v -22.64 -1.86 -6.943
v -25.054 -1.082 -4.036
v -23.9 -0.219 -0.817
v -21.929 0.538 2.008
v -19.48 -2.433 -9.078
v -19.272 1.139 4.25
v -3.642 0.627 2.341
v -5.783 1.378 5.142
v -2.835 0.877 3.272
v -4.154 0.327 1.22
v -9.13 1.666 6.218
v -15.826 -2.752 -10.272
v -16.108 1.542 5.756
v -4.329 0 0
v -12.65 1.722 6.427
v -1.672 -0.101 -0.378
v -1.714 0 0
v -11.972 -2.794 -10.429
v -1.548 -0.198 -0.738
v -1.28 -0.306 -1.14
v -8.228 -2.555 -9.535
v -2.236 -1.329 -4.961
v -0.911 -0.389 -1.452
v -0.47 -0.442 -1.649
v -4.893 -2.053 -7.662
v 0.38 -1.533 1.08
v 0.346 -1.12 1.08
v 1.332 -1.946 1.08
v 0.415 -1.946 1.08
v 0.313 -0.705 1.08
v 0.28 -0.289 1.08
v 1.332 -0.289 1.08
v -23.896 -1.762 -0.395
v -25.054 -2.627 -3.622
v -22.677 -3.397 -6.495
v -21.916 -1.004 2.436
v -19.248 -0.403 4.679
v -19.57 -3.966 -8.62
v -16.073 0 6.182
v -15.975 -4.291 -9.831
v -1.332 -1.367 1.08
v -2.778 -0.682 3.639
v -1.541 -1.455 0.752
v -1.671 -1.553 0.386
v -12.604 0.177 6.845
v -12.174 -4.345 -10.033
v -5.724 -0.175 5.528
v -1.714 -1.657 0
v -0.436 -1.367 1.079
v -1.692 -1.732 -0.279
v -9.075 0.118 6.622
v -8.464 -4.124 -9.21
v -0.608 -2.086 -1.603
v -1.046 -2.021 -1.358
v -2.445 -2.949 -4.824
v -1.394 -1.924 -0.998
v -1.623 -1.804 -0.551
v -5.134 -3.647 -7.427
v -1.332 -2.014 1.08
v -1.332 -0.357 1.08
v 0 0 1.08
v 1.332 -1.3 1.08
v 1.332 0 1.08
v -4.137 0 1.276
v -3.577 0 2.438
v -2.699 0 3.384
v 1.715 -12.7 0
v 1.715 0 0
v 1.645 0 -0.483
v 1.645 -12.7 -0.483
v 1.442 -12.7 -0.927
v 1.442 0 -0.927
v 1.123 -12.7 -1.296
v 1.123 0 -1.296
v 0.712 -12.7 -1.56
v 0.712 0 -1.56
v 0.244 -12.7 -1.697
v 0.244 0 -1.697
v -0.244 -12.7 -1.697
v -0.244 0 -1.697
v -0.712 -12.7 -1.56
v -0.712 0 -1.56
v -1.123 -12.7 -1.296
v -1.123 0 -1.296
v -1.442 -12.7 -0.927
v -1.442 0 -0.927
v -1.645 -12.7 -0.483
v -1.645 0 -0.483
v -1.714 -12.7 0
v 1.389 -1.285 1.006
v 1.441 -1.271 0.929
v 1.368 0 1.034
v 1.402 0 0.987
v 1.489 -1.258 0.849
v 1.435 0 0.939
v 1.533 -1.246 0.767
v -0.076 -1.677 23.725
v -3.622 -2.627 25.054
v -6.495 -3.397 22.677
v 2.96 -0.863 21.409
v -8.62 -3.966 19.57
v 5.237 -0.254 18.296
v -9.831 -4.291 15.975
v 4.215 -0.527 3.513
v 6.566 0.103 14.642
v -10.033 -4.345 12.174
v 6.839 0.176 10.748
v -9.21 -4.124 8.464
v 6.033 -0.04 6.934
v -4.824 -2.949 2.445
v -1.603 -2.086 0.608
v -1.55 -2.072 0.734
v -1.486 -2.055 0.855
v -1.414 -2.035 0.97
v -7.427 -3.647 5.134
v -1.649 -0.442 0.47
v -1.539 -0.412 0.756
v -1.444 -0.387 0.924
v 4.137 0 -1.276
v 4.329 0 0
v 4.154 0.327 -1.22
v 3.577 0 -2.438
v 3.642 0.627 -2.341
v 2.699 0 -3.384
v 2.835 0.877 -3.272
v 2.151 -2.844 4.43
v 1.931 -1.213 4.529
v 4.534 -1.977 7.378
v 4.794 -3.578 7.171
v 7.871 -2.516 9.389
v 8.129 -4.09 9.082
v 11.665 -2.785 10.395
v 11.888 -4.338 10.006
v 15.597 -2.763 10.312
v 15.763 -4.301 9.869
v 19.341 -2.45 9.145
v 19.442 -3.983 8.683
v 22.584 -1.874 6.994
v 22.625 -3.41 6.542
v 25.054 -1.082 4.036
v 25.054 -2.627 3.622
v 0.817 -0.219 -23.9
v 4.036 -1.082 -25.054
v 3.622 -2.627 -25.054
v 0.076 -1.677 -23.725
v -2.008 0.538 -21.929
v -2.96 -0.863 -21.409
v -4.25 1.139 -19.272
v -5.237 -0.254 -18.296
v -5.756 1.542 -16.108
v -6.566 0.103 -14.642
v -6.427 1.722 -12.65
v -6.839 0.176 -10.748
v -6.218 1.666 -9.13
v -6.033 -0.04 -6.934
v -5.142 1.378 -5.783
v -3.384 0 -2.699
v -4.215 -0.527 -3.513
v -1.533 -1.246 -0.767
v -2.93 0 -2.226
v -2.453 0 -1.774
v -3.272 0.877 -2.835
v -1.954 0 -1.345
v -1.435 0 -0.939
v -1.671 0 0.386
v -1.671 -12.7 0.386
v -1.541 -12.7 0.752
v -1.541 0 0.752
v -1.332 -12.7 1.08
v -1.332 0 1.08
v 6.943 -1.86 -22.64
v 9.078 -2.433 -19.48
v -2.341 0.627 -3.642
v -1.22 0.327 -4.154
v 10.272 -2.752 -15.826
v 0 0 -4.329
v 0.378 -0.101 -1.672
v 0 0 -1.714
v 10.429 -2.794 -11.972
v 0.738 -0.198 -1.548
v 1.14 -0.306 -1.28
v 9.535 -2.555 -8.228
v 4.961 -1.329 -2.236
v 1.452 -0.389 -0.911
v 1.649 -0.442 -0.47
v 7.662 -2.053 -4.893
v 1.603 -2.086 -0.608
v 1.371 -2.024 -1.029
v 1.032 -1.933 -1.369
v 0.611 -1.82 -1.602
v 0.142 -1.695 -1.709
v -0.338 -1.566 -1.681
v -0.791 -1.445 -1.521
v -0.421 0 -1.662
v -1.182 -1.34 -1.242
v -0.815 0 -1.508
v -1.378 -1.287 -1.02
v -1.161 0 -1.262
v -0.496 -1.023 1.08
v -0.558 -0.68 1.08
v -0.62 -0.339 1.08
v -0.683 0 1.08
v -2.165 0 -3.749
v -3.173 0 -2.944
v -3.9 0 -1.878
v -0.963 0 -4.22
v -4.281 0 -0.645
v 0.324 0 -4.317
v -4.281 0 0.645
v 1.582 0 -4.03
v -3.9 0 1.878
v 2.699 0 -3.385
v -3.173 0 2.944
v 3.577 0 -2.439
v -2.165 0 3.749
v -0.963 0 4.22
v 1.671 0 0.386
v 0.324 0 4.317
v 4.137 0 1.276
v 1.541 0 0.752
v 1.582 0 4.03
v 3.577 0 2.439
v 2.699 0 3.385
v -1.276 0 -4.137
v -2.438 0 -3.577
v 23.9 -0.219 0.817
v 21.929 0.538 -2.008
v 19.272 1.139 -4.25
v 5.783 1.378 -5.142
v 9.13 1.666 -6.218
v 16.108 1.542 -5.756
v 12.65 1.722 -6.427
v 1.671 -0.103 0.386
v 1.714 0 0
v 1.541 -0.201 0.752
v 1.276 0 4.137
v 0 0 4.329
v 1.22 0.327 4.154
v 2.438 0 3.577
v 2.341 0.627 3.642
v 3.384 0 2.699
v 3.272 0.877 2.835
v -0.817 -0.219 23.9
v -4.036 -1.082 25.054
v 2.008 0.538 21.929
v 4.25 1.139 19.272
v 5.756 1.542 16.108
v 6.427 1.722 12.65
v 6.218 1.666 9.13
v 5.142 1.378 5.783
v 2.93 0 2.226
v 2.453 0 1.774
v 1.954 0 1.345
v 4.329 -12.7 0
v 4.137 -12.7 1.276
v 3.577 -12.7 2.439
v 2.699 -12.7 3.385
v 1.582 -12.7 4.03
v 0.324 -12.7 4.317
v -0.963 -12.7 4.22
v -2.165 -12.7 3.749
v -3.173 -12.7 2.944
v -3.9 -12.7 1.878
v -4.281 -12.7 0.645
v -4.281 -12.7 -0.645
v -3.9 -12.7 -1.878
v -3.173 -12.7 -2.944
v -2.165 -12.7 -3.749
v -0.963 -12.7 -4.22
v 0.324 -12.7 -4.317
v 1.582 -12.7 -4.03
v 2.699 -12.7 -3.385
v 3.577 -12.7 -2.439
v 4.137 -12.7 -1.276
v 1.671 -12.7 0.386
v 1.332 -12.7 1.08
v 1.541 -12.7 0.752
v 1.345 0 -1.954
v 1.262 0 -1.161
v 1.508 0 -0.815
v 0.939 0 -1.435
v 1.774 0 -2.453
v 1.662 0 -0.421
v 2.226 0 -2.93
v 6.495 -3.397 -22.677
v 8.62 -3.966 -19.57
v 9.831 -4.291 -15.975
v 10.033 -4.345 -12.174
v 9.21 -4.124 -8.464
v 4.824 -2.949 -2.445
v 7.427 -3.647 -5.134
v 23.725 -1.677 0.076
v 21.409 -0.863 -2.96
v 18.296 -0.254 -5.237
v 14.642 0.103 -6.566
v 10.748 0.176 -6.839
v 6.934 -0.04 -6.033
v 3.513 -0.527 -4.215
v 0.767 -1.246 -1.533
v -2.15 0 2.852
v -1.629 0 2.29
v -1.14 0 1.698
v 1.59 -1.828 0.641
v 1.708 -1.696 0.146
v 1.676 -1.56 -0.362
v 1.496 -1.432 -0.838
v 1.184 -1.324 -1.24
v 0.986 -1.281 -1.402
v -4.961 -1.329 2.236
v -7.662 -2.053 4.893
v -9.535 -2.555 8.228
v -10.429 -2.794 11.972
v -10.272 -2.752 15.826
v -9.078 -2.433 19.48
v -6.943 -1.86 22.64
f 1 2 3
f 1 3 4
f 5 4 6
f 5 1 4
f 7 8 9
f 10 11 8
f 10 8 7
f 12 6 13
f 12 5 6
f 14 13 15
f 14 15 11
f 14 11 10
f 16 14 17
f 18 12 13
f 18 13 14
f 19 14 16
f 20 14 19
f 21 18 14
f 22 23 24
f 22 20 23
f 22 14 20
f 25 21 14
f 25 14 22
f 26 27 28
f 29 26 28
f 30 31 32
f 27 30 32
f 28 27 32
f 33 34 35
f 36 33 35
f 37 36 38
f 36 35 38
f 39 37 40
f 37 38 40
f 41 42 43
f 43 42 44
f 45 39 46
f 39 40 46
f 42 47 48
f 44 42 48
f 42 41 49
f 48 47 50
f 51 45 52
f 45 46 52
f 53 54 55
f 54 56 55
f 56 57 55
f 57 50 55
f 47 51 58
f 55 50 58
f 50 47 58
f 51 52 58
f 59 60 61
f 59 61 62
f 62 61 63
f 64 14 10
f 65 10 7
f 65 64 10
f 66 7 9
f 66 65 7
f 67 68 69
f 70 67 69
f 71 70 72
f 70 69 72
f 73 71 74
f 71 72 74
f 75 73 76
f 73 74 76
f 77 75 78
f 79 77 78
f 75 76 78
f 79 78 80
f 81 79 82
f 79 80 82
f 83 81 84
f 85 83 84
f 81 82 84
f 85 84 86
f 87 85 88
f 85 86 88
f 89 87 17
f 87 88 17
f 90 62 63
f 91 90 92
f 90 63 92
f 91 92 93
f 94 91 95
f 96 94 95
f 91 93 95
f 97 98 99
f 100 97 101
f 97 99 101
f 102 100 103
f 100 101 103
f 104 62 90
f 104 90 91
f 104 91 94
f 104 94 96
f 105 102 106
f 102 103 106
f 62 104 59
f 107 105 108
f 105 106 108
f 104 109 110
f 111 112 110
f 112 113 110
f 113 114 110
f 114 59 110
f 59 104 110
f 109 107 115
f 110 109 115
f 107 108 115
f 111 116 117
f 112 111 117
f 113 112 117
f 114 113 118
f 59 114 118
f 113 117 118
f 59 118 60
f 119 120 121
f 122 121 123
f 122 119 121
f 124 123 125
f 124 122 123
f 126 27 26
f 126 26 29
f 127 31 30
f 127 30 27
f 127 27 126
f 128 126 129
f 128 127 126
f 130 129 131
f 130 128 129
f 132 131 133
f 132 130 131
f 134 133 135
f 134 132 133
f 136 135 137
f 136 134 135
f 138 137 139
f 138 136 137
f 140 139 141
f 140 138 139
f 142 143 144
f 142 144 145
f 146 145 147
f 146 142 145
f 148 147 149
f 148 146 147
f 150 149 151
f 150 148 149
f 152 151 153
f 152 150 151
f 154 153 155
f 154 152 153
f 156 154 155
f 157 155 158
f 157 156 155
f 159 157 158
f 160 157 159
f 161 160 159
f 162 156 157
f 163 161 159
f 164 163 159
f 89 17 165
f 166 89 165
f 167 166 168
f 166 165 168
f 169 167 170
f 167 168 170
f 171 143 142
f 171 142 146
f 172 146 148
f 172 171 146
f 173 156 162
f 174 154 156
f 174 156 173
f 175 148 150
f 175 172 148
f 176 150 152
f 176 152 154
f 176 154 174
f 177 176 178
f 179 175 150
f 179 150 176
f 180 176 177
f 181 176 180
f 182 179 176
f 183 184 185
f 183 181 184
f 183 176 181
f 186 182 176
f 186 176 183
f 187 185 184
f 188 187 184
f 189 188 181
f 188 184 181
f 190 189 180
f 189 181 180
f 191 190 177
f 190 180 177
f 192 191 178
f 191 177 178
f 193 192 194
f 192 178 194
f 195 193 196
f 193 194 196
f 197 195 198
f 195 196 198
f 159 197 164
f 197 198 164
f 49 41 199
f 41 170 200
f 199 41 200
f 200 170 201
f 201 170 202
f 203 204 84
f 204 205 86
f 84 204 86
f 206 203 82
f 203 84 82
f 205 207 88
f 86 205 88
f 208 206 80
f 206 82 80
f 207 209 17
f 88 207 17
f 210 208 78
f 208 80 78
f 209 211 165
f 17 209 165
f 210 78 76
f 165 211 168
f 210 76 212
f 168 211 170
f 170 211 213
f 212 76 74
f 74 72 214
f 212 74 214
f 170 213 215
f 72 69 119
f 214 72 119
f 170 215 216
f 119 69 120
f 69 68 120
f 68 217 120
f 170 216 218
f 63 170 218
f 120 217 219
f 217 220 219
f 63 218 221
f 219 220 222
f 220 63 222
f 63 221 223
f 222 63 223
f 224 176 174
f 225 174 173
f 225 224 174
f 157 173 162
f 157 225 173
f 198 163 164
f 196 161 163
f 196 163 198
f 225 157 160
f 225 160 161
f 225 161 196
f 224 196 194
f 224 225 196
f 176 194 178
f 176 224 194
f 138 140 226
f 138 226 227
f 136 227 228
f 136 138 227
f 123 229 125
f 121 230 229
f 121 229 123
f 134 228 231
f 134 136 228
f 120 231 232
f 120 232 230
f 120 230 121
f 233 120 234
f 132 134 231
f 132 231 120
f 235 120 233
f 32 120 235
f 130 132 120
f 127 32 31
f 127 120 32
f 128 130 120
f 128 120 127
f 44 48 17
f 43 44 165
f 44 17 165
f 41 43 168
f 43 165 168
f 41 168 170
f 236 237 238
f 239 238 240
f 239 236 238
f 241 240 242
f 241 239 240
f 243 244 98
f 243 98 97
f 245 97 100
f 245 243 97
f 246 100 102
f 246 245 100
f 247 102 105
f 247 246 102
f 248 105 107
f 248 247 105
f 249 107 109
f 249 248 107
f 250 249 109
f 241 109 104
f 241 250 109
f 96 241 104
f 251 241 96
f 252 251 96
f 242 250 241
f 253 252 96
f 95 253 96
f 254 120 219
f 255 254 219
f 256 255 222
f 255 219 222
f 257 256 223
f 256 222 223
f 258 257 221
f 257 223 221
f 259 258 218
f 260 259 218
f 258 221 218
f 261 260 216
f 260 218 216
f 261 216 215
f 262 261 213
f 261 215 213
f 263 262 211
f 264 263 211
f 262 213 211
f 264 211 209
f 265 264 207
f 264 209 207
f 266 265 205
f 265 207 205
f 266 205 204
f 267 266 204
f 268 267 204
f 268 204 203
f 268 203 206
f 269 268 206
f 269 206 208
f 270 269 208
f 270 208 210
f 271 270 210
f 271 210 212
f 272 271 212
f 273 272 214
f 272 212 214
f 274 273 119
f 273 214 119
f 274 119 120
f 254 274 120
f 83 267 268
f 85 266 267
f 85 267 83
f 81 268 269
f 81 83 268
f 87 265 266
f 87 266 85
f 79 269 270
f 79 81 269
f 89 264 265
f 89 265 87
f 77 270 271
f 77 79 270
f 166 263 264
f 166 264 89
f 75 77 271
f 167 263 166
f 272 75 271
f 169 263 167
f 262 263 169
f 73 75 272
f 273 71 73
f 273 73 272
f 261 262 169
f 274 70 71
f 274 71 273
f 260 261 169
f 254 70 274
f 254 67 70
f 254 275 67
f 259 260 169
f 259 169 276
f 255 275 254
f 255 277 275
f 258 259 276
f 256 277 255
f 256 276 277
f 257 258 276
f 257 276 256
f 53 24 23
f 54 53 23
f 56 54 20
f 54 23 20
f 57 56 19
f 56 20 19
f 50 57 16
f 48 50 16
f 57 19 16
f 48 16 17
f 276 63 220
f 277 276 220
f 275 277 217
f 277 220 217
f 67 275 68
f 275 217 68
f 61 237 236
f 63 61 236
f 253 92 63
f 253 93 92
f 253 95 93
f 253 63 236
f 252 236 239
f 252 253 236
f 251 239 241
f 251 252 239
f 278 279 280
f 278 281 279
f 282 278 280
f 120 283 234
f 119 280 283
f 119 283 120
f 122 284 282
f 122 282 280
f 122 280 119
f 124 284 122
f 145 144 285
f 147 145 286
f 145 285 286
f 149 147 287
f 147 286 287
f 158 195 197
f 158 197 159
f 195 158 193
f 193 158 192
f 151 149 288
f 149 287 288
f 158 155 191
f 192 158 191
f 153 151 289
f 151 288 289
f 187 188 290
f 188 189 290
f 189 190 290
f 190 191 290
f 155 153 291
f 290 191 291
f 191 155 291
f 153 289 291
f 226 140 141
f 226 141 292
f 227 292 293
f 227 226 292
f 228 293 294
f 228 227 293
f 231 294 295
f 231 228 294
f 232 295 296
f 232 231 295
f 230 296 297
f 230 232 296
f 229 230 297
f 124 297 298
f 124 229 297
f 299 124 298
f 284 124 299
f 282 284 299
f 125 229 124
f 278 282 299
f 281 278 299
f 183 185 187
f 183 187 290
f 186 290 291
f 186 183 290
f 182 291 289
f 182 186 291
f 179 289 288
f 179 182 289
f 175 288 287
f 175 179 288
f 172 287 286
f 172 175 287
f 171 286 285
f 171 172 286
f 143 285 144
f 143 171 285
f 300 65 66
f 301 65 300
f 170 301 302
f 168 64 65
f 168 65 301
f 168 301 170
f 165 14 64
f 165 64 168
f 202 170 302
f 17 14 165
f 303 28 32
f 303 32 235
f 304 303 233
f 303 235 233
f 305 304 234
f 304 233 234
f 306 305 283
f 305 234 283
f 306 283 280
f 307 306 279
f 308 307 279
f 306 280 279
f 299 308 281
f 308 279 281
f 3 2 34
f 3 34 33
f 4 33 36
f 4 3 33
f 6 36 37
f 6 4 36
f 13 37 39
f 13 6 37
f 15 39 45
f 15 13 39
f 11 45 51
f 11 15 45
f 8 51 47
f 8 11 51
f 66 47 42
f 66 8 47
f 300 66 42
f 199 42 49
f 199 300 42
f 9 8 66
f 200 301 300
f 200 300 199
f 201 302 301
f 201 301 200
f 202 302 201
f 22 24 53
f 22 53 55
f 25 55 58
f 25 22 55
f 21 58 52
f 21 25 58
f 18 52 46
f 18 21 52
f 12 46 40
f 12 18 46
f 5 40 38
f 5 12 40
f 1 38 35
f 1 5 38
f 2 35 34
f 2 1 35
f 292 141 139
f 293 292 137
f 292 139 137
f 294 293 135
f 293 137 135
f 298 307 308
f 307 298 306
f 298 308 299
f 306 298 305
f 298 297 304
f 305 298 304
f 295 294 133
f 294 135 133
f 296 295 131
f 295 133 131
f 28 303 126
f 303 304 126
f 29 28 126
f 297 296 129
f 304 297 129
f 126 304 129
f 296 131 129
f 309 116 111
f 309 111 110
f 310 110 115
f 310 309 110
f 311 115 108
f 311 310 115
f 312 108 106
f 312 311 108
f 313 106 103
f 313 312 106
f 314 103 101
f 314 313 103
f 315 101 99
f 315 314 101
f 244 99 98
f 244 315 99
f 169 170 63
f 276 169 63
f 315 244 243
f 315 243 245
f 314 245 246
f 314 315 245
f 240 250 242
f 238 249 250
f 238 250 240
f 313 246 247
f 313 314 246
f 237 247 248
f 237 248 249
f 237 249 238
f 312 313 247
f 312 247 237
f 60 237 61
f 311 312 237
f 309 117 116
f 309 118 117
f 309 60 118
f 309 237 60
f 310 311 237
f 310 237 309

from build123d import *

# Parameters (mm, degrees)
F0_R      = 4.329036
F1_DEPTH  = 12.7
F5_DEPTH  = 1.6002
F6_COUNT  = 4
F8_DEPTH  = 25.4
F1_FACE_R = 4.329036
F9_DEPTH  = 25.4
F11_DEPTH = 25.4


with BuildPart() as f1:
    # F0 (on Front) → F1 (new body)
    with BuildSketch(Plane.XZ):
        Circle(F0_R)
        with BuildLine():
            ThreePointArc((-1.7145, 0), (-1.616045, 0.572633), (-1.331987, 1.0795))
            Line((-1.331987, 1.0795), (1.331987, 1.0795))
            ThreePointArc((1.331987, 1.0795), (1.616045, 0.572633), (1.7145, 0))
            ThreePointArc((1.7145, 0), (0, -1.7145), (-1.7145, 0))
        make_face(mode=Mode.SUBTRACT)
    extrude(amount=F1_DEPTH)


with BuildPart() as f5:
    # F4 (on face) → F5 (new body)
    with BuildSketch(Plane(origin=(0, 0, 0), x_dir=(-1, 0, 0), z_dir=(0, 0.965926, 0.258819))):
        with BuildLine():
            ThreePointArc((-25.05391, 4.178705), (-13.959651, -6.50054), (0, 0))
            Line((0, 0), (-25.05391, 4.178705))
        make_face()
        with BuildLine():
            Line((-25.05391, 4.178705), (0, 0))
            ThreePointArc((0, 0), (-11.09426, 10.679245), (-25.05391, 4.178705))
        make_face()
    extrude(amount=-F5_DEPTH)


with BuildPart() as f6_1:
    # F6: instance of F5
    add(f5.part.rotate(Axis((0, 0, 0), (0, 1, 0)), 1 * 360 / F6_COUNT))


with BuildPart() as f6_2:
    # F6: instance of F5
    add(f5.part.rotate(Axis((0, 0, 0), (0, 1, 0)), 2 * 360 / F6_COUNT))


with BuildPart() as f6_3:
    # F6: instance of F5
    add(f5.part.rotate(Axis((0, 0, 0), (0, 1, 0)), 3 * 360 / F6_COUNT))


with BuildPart() as f8_tool:
    # F7 (on face) → F8 (new body)
    with BuildSketch(Plane(origin=(0, 0, 0), x_dir=(-1, 0, 0), z_dir=(0, 1, 0))):
        with BuildLine():
            ThreePointArc((-1.331987, 1.0795), (-0.572633, -1.616045), (1.7145, 0))
            ThreePointArc((1.7145, 0), (1.616045, 0.572633), (1.331987, 1.0795))
            Line((1.331987, 1.0795), (-1.331987, 1.0795))
        make_face()
    extrude(amount=-F8_DEPTH)


with BuildPart() as f5_1:
    add(f5.part)

    # F8: cut by f8_tool
    add(f8_tool.part, mode=Mode.SUBTRACT)


with BuildPart() as f6_1_1:
    add(f6_1.part)

    # F8: cut by f8_tool
    add(f8_tool.part, mode=Mode.SUBTRACT)


with BuildPart() as f6_2_1:
    add(f6_2.part)

    # F8: cut by f8_tool
    add(f8_tool.part, mode=Mode.SUBTRACT)


with BuildPart() as f6_3_1:
    add(f6_3.part)

    # F8: cut by f8_tool
    add(f8_tool.part, mode=Mode.SUBTRACT)


with BuildPart() as f9_tool:
    # F1_face (on face) → F9 (new body)
    with BuildSketch(Plane(origin=(0, 0, 0.031002), x_dir=(1, 0, 0), z_dir=(0, 1, 0))):
        with Locations((0, 0.031002)):
            Circle(F1_FACE_R)
        with BuildLine():
            ThreePointArc((-1.7145, 0.031002), (0.572633, 1.647047), (1.331987, -1.048498))
            Line((1.331987, -1.048498), (-1.331987, -1.048498))
            ThreePointArc((-1.331987, -1.048498), (-1.616045, -0.541631), (-1.7145, 0.031002))
        make_face(mode=Mode.SUBTRACT)
    extrude(amount=F9_DEPTH)


with BuildPart() as f5_2:
    add(f5_1.part)

    # F9: cut by f9_tool
    add(f9_tool.part, mode=Mode.SUBTRACT)


with BuildPart() as f6_1_2:
    add(f6_1_1.part)

    # F9: cut by f9_tool
    add(f9_tool.part, mode=Mode.SUBTRACT)


with BuildPart() as f6_2_2:
    add(f6_2_1.part)

    # F9: cut by f9_tool
    add(f9_tool.part, mode=Mode.SUBTRACT)


with BuildPart() as f6_3_2:
    add(f6_3_1.part)

    # F9: cut by f9_tool
    add(f9_tool.part, mode=Mode.SUBTRACT)


with BuildPart() as f11_tool:
    # F10 (on face) → F11 (new body)
    with BuildSketch(Plane(origin=(0, 0, 0), x_dir=(-1, 0, 0), z_dir=(0, 1, 0))):
        with BuildLine():
            ThreePointArc((-1.331987, 1.0795), (-0.572633, -1.616045), (1.7145, 0))
            ThreePointArc((1.7145, 0), (1.616045, 0.572633), (1.331987, 1.0795))
            Line((1.331987, 1.0795), (-1.331987, 1.0795))
        make_face()
    extrude(amount=F11_DEPTH)


with BuildPart() as f5_3:
    add(f5_2.part)

    # F11: cut by f11_tool
    add(f11_tool.part, mode=Mode.SUBTRACT)


with BuildPart() as f6_1_3:
    add(f6_1_2.part)

    # F11: cut by f11_tool
    add(f11_tool.part, mode=Mode.SUBTRACT)


with BuildPart() as f6_2_3:
    add(f6_2_2.part)

    # F11: cut by f11_tool
    add(f11_tool.part, mode=Mode.SUBTRACT)


with BuildPart() as f6_3_3:
    add(f6_3_2.part)

    # F11: cut by f11_tool
    add(f11_tool.part, mode=Mode.SUBTRACT)


solid = Compound([f1.part, f5_3.part, f6_1_3.part, f6_2_3.part, f6_3_3.part])
